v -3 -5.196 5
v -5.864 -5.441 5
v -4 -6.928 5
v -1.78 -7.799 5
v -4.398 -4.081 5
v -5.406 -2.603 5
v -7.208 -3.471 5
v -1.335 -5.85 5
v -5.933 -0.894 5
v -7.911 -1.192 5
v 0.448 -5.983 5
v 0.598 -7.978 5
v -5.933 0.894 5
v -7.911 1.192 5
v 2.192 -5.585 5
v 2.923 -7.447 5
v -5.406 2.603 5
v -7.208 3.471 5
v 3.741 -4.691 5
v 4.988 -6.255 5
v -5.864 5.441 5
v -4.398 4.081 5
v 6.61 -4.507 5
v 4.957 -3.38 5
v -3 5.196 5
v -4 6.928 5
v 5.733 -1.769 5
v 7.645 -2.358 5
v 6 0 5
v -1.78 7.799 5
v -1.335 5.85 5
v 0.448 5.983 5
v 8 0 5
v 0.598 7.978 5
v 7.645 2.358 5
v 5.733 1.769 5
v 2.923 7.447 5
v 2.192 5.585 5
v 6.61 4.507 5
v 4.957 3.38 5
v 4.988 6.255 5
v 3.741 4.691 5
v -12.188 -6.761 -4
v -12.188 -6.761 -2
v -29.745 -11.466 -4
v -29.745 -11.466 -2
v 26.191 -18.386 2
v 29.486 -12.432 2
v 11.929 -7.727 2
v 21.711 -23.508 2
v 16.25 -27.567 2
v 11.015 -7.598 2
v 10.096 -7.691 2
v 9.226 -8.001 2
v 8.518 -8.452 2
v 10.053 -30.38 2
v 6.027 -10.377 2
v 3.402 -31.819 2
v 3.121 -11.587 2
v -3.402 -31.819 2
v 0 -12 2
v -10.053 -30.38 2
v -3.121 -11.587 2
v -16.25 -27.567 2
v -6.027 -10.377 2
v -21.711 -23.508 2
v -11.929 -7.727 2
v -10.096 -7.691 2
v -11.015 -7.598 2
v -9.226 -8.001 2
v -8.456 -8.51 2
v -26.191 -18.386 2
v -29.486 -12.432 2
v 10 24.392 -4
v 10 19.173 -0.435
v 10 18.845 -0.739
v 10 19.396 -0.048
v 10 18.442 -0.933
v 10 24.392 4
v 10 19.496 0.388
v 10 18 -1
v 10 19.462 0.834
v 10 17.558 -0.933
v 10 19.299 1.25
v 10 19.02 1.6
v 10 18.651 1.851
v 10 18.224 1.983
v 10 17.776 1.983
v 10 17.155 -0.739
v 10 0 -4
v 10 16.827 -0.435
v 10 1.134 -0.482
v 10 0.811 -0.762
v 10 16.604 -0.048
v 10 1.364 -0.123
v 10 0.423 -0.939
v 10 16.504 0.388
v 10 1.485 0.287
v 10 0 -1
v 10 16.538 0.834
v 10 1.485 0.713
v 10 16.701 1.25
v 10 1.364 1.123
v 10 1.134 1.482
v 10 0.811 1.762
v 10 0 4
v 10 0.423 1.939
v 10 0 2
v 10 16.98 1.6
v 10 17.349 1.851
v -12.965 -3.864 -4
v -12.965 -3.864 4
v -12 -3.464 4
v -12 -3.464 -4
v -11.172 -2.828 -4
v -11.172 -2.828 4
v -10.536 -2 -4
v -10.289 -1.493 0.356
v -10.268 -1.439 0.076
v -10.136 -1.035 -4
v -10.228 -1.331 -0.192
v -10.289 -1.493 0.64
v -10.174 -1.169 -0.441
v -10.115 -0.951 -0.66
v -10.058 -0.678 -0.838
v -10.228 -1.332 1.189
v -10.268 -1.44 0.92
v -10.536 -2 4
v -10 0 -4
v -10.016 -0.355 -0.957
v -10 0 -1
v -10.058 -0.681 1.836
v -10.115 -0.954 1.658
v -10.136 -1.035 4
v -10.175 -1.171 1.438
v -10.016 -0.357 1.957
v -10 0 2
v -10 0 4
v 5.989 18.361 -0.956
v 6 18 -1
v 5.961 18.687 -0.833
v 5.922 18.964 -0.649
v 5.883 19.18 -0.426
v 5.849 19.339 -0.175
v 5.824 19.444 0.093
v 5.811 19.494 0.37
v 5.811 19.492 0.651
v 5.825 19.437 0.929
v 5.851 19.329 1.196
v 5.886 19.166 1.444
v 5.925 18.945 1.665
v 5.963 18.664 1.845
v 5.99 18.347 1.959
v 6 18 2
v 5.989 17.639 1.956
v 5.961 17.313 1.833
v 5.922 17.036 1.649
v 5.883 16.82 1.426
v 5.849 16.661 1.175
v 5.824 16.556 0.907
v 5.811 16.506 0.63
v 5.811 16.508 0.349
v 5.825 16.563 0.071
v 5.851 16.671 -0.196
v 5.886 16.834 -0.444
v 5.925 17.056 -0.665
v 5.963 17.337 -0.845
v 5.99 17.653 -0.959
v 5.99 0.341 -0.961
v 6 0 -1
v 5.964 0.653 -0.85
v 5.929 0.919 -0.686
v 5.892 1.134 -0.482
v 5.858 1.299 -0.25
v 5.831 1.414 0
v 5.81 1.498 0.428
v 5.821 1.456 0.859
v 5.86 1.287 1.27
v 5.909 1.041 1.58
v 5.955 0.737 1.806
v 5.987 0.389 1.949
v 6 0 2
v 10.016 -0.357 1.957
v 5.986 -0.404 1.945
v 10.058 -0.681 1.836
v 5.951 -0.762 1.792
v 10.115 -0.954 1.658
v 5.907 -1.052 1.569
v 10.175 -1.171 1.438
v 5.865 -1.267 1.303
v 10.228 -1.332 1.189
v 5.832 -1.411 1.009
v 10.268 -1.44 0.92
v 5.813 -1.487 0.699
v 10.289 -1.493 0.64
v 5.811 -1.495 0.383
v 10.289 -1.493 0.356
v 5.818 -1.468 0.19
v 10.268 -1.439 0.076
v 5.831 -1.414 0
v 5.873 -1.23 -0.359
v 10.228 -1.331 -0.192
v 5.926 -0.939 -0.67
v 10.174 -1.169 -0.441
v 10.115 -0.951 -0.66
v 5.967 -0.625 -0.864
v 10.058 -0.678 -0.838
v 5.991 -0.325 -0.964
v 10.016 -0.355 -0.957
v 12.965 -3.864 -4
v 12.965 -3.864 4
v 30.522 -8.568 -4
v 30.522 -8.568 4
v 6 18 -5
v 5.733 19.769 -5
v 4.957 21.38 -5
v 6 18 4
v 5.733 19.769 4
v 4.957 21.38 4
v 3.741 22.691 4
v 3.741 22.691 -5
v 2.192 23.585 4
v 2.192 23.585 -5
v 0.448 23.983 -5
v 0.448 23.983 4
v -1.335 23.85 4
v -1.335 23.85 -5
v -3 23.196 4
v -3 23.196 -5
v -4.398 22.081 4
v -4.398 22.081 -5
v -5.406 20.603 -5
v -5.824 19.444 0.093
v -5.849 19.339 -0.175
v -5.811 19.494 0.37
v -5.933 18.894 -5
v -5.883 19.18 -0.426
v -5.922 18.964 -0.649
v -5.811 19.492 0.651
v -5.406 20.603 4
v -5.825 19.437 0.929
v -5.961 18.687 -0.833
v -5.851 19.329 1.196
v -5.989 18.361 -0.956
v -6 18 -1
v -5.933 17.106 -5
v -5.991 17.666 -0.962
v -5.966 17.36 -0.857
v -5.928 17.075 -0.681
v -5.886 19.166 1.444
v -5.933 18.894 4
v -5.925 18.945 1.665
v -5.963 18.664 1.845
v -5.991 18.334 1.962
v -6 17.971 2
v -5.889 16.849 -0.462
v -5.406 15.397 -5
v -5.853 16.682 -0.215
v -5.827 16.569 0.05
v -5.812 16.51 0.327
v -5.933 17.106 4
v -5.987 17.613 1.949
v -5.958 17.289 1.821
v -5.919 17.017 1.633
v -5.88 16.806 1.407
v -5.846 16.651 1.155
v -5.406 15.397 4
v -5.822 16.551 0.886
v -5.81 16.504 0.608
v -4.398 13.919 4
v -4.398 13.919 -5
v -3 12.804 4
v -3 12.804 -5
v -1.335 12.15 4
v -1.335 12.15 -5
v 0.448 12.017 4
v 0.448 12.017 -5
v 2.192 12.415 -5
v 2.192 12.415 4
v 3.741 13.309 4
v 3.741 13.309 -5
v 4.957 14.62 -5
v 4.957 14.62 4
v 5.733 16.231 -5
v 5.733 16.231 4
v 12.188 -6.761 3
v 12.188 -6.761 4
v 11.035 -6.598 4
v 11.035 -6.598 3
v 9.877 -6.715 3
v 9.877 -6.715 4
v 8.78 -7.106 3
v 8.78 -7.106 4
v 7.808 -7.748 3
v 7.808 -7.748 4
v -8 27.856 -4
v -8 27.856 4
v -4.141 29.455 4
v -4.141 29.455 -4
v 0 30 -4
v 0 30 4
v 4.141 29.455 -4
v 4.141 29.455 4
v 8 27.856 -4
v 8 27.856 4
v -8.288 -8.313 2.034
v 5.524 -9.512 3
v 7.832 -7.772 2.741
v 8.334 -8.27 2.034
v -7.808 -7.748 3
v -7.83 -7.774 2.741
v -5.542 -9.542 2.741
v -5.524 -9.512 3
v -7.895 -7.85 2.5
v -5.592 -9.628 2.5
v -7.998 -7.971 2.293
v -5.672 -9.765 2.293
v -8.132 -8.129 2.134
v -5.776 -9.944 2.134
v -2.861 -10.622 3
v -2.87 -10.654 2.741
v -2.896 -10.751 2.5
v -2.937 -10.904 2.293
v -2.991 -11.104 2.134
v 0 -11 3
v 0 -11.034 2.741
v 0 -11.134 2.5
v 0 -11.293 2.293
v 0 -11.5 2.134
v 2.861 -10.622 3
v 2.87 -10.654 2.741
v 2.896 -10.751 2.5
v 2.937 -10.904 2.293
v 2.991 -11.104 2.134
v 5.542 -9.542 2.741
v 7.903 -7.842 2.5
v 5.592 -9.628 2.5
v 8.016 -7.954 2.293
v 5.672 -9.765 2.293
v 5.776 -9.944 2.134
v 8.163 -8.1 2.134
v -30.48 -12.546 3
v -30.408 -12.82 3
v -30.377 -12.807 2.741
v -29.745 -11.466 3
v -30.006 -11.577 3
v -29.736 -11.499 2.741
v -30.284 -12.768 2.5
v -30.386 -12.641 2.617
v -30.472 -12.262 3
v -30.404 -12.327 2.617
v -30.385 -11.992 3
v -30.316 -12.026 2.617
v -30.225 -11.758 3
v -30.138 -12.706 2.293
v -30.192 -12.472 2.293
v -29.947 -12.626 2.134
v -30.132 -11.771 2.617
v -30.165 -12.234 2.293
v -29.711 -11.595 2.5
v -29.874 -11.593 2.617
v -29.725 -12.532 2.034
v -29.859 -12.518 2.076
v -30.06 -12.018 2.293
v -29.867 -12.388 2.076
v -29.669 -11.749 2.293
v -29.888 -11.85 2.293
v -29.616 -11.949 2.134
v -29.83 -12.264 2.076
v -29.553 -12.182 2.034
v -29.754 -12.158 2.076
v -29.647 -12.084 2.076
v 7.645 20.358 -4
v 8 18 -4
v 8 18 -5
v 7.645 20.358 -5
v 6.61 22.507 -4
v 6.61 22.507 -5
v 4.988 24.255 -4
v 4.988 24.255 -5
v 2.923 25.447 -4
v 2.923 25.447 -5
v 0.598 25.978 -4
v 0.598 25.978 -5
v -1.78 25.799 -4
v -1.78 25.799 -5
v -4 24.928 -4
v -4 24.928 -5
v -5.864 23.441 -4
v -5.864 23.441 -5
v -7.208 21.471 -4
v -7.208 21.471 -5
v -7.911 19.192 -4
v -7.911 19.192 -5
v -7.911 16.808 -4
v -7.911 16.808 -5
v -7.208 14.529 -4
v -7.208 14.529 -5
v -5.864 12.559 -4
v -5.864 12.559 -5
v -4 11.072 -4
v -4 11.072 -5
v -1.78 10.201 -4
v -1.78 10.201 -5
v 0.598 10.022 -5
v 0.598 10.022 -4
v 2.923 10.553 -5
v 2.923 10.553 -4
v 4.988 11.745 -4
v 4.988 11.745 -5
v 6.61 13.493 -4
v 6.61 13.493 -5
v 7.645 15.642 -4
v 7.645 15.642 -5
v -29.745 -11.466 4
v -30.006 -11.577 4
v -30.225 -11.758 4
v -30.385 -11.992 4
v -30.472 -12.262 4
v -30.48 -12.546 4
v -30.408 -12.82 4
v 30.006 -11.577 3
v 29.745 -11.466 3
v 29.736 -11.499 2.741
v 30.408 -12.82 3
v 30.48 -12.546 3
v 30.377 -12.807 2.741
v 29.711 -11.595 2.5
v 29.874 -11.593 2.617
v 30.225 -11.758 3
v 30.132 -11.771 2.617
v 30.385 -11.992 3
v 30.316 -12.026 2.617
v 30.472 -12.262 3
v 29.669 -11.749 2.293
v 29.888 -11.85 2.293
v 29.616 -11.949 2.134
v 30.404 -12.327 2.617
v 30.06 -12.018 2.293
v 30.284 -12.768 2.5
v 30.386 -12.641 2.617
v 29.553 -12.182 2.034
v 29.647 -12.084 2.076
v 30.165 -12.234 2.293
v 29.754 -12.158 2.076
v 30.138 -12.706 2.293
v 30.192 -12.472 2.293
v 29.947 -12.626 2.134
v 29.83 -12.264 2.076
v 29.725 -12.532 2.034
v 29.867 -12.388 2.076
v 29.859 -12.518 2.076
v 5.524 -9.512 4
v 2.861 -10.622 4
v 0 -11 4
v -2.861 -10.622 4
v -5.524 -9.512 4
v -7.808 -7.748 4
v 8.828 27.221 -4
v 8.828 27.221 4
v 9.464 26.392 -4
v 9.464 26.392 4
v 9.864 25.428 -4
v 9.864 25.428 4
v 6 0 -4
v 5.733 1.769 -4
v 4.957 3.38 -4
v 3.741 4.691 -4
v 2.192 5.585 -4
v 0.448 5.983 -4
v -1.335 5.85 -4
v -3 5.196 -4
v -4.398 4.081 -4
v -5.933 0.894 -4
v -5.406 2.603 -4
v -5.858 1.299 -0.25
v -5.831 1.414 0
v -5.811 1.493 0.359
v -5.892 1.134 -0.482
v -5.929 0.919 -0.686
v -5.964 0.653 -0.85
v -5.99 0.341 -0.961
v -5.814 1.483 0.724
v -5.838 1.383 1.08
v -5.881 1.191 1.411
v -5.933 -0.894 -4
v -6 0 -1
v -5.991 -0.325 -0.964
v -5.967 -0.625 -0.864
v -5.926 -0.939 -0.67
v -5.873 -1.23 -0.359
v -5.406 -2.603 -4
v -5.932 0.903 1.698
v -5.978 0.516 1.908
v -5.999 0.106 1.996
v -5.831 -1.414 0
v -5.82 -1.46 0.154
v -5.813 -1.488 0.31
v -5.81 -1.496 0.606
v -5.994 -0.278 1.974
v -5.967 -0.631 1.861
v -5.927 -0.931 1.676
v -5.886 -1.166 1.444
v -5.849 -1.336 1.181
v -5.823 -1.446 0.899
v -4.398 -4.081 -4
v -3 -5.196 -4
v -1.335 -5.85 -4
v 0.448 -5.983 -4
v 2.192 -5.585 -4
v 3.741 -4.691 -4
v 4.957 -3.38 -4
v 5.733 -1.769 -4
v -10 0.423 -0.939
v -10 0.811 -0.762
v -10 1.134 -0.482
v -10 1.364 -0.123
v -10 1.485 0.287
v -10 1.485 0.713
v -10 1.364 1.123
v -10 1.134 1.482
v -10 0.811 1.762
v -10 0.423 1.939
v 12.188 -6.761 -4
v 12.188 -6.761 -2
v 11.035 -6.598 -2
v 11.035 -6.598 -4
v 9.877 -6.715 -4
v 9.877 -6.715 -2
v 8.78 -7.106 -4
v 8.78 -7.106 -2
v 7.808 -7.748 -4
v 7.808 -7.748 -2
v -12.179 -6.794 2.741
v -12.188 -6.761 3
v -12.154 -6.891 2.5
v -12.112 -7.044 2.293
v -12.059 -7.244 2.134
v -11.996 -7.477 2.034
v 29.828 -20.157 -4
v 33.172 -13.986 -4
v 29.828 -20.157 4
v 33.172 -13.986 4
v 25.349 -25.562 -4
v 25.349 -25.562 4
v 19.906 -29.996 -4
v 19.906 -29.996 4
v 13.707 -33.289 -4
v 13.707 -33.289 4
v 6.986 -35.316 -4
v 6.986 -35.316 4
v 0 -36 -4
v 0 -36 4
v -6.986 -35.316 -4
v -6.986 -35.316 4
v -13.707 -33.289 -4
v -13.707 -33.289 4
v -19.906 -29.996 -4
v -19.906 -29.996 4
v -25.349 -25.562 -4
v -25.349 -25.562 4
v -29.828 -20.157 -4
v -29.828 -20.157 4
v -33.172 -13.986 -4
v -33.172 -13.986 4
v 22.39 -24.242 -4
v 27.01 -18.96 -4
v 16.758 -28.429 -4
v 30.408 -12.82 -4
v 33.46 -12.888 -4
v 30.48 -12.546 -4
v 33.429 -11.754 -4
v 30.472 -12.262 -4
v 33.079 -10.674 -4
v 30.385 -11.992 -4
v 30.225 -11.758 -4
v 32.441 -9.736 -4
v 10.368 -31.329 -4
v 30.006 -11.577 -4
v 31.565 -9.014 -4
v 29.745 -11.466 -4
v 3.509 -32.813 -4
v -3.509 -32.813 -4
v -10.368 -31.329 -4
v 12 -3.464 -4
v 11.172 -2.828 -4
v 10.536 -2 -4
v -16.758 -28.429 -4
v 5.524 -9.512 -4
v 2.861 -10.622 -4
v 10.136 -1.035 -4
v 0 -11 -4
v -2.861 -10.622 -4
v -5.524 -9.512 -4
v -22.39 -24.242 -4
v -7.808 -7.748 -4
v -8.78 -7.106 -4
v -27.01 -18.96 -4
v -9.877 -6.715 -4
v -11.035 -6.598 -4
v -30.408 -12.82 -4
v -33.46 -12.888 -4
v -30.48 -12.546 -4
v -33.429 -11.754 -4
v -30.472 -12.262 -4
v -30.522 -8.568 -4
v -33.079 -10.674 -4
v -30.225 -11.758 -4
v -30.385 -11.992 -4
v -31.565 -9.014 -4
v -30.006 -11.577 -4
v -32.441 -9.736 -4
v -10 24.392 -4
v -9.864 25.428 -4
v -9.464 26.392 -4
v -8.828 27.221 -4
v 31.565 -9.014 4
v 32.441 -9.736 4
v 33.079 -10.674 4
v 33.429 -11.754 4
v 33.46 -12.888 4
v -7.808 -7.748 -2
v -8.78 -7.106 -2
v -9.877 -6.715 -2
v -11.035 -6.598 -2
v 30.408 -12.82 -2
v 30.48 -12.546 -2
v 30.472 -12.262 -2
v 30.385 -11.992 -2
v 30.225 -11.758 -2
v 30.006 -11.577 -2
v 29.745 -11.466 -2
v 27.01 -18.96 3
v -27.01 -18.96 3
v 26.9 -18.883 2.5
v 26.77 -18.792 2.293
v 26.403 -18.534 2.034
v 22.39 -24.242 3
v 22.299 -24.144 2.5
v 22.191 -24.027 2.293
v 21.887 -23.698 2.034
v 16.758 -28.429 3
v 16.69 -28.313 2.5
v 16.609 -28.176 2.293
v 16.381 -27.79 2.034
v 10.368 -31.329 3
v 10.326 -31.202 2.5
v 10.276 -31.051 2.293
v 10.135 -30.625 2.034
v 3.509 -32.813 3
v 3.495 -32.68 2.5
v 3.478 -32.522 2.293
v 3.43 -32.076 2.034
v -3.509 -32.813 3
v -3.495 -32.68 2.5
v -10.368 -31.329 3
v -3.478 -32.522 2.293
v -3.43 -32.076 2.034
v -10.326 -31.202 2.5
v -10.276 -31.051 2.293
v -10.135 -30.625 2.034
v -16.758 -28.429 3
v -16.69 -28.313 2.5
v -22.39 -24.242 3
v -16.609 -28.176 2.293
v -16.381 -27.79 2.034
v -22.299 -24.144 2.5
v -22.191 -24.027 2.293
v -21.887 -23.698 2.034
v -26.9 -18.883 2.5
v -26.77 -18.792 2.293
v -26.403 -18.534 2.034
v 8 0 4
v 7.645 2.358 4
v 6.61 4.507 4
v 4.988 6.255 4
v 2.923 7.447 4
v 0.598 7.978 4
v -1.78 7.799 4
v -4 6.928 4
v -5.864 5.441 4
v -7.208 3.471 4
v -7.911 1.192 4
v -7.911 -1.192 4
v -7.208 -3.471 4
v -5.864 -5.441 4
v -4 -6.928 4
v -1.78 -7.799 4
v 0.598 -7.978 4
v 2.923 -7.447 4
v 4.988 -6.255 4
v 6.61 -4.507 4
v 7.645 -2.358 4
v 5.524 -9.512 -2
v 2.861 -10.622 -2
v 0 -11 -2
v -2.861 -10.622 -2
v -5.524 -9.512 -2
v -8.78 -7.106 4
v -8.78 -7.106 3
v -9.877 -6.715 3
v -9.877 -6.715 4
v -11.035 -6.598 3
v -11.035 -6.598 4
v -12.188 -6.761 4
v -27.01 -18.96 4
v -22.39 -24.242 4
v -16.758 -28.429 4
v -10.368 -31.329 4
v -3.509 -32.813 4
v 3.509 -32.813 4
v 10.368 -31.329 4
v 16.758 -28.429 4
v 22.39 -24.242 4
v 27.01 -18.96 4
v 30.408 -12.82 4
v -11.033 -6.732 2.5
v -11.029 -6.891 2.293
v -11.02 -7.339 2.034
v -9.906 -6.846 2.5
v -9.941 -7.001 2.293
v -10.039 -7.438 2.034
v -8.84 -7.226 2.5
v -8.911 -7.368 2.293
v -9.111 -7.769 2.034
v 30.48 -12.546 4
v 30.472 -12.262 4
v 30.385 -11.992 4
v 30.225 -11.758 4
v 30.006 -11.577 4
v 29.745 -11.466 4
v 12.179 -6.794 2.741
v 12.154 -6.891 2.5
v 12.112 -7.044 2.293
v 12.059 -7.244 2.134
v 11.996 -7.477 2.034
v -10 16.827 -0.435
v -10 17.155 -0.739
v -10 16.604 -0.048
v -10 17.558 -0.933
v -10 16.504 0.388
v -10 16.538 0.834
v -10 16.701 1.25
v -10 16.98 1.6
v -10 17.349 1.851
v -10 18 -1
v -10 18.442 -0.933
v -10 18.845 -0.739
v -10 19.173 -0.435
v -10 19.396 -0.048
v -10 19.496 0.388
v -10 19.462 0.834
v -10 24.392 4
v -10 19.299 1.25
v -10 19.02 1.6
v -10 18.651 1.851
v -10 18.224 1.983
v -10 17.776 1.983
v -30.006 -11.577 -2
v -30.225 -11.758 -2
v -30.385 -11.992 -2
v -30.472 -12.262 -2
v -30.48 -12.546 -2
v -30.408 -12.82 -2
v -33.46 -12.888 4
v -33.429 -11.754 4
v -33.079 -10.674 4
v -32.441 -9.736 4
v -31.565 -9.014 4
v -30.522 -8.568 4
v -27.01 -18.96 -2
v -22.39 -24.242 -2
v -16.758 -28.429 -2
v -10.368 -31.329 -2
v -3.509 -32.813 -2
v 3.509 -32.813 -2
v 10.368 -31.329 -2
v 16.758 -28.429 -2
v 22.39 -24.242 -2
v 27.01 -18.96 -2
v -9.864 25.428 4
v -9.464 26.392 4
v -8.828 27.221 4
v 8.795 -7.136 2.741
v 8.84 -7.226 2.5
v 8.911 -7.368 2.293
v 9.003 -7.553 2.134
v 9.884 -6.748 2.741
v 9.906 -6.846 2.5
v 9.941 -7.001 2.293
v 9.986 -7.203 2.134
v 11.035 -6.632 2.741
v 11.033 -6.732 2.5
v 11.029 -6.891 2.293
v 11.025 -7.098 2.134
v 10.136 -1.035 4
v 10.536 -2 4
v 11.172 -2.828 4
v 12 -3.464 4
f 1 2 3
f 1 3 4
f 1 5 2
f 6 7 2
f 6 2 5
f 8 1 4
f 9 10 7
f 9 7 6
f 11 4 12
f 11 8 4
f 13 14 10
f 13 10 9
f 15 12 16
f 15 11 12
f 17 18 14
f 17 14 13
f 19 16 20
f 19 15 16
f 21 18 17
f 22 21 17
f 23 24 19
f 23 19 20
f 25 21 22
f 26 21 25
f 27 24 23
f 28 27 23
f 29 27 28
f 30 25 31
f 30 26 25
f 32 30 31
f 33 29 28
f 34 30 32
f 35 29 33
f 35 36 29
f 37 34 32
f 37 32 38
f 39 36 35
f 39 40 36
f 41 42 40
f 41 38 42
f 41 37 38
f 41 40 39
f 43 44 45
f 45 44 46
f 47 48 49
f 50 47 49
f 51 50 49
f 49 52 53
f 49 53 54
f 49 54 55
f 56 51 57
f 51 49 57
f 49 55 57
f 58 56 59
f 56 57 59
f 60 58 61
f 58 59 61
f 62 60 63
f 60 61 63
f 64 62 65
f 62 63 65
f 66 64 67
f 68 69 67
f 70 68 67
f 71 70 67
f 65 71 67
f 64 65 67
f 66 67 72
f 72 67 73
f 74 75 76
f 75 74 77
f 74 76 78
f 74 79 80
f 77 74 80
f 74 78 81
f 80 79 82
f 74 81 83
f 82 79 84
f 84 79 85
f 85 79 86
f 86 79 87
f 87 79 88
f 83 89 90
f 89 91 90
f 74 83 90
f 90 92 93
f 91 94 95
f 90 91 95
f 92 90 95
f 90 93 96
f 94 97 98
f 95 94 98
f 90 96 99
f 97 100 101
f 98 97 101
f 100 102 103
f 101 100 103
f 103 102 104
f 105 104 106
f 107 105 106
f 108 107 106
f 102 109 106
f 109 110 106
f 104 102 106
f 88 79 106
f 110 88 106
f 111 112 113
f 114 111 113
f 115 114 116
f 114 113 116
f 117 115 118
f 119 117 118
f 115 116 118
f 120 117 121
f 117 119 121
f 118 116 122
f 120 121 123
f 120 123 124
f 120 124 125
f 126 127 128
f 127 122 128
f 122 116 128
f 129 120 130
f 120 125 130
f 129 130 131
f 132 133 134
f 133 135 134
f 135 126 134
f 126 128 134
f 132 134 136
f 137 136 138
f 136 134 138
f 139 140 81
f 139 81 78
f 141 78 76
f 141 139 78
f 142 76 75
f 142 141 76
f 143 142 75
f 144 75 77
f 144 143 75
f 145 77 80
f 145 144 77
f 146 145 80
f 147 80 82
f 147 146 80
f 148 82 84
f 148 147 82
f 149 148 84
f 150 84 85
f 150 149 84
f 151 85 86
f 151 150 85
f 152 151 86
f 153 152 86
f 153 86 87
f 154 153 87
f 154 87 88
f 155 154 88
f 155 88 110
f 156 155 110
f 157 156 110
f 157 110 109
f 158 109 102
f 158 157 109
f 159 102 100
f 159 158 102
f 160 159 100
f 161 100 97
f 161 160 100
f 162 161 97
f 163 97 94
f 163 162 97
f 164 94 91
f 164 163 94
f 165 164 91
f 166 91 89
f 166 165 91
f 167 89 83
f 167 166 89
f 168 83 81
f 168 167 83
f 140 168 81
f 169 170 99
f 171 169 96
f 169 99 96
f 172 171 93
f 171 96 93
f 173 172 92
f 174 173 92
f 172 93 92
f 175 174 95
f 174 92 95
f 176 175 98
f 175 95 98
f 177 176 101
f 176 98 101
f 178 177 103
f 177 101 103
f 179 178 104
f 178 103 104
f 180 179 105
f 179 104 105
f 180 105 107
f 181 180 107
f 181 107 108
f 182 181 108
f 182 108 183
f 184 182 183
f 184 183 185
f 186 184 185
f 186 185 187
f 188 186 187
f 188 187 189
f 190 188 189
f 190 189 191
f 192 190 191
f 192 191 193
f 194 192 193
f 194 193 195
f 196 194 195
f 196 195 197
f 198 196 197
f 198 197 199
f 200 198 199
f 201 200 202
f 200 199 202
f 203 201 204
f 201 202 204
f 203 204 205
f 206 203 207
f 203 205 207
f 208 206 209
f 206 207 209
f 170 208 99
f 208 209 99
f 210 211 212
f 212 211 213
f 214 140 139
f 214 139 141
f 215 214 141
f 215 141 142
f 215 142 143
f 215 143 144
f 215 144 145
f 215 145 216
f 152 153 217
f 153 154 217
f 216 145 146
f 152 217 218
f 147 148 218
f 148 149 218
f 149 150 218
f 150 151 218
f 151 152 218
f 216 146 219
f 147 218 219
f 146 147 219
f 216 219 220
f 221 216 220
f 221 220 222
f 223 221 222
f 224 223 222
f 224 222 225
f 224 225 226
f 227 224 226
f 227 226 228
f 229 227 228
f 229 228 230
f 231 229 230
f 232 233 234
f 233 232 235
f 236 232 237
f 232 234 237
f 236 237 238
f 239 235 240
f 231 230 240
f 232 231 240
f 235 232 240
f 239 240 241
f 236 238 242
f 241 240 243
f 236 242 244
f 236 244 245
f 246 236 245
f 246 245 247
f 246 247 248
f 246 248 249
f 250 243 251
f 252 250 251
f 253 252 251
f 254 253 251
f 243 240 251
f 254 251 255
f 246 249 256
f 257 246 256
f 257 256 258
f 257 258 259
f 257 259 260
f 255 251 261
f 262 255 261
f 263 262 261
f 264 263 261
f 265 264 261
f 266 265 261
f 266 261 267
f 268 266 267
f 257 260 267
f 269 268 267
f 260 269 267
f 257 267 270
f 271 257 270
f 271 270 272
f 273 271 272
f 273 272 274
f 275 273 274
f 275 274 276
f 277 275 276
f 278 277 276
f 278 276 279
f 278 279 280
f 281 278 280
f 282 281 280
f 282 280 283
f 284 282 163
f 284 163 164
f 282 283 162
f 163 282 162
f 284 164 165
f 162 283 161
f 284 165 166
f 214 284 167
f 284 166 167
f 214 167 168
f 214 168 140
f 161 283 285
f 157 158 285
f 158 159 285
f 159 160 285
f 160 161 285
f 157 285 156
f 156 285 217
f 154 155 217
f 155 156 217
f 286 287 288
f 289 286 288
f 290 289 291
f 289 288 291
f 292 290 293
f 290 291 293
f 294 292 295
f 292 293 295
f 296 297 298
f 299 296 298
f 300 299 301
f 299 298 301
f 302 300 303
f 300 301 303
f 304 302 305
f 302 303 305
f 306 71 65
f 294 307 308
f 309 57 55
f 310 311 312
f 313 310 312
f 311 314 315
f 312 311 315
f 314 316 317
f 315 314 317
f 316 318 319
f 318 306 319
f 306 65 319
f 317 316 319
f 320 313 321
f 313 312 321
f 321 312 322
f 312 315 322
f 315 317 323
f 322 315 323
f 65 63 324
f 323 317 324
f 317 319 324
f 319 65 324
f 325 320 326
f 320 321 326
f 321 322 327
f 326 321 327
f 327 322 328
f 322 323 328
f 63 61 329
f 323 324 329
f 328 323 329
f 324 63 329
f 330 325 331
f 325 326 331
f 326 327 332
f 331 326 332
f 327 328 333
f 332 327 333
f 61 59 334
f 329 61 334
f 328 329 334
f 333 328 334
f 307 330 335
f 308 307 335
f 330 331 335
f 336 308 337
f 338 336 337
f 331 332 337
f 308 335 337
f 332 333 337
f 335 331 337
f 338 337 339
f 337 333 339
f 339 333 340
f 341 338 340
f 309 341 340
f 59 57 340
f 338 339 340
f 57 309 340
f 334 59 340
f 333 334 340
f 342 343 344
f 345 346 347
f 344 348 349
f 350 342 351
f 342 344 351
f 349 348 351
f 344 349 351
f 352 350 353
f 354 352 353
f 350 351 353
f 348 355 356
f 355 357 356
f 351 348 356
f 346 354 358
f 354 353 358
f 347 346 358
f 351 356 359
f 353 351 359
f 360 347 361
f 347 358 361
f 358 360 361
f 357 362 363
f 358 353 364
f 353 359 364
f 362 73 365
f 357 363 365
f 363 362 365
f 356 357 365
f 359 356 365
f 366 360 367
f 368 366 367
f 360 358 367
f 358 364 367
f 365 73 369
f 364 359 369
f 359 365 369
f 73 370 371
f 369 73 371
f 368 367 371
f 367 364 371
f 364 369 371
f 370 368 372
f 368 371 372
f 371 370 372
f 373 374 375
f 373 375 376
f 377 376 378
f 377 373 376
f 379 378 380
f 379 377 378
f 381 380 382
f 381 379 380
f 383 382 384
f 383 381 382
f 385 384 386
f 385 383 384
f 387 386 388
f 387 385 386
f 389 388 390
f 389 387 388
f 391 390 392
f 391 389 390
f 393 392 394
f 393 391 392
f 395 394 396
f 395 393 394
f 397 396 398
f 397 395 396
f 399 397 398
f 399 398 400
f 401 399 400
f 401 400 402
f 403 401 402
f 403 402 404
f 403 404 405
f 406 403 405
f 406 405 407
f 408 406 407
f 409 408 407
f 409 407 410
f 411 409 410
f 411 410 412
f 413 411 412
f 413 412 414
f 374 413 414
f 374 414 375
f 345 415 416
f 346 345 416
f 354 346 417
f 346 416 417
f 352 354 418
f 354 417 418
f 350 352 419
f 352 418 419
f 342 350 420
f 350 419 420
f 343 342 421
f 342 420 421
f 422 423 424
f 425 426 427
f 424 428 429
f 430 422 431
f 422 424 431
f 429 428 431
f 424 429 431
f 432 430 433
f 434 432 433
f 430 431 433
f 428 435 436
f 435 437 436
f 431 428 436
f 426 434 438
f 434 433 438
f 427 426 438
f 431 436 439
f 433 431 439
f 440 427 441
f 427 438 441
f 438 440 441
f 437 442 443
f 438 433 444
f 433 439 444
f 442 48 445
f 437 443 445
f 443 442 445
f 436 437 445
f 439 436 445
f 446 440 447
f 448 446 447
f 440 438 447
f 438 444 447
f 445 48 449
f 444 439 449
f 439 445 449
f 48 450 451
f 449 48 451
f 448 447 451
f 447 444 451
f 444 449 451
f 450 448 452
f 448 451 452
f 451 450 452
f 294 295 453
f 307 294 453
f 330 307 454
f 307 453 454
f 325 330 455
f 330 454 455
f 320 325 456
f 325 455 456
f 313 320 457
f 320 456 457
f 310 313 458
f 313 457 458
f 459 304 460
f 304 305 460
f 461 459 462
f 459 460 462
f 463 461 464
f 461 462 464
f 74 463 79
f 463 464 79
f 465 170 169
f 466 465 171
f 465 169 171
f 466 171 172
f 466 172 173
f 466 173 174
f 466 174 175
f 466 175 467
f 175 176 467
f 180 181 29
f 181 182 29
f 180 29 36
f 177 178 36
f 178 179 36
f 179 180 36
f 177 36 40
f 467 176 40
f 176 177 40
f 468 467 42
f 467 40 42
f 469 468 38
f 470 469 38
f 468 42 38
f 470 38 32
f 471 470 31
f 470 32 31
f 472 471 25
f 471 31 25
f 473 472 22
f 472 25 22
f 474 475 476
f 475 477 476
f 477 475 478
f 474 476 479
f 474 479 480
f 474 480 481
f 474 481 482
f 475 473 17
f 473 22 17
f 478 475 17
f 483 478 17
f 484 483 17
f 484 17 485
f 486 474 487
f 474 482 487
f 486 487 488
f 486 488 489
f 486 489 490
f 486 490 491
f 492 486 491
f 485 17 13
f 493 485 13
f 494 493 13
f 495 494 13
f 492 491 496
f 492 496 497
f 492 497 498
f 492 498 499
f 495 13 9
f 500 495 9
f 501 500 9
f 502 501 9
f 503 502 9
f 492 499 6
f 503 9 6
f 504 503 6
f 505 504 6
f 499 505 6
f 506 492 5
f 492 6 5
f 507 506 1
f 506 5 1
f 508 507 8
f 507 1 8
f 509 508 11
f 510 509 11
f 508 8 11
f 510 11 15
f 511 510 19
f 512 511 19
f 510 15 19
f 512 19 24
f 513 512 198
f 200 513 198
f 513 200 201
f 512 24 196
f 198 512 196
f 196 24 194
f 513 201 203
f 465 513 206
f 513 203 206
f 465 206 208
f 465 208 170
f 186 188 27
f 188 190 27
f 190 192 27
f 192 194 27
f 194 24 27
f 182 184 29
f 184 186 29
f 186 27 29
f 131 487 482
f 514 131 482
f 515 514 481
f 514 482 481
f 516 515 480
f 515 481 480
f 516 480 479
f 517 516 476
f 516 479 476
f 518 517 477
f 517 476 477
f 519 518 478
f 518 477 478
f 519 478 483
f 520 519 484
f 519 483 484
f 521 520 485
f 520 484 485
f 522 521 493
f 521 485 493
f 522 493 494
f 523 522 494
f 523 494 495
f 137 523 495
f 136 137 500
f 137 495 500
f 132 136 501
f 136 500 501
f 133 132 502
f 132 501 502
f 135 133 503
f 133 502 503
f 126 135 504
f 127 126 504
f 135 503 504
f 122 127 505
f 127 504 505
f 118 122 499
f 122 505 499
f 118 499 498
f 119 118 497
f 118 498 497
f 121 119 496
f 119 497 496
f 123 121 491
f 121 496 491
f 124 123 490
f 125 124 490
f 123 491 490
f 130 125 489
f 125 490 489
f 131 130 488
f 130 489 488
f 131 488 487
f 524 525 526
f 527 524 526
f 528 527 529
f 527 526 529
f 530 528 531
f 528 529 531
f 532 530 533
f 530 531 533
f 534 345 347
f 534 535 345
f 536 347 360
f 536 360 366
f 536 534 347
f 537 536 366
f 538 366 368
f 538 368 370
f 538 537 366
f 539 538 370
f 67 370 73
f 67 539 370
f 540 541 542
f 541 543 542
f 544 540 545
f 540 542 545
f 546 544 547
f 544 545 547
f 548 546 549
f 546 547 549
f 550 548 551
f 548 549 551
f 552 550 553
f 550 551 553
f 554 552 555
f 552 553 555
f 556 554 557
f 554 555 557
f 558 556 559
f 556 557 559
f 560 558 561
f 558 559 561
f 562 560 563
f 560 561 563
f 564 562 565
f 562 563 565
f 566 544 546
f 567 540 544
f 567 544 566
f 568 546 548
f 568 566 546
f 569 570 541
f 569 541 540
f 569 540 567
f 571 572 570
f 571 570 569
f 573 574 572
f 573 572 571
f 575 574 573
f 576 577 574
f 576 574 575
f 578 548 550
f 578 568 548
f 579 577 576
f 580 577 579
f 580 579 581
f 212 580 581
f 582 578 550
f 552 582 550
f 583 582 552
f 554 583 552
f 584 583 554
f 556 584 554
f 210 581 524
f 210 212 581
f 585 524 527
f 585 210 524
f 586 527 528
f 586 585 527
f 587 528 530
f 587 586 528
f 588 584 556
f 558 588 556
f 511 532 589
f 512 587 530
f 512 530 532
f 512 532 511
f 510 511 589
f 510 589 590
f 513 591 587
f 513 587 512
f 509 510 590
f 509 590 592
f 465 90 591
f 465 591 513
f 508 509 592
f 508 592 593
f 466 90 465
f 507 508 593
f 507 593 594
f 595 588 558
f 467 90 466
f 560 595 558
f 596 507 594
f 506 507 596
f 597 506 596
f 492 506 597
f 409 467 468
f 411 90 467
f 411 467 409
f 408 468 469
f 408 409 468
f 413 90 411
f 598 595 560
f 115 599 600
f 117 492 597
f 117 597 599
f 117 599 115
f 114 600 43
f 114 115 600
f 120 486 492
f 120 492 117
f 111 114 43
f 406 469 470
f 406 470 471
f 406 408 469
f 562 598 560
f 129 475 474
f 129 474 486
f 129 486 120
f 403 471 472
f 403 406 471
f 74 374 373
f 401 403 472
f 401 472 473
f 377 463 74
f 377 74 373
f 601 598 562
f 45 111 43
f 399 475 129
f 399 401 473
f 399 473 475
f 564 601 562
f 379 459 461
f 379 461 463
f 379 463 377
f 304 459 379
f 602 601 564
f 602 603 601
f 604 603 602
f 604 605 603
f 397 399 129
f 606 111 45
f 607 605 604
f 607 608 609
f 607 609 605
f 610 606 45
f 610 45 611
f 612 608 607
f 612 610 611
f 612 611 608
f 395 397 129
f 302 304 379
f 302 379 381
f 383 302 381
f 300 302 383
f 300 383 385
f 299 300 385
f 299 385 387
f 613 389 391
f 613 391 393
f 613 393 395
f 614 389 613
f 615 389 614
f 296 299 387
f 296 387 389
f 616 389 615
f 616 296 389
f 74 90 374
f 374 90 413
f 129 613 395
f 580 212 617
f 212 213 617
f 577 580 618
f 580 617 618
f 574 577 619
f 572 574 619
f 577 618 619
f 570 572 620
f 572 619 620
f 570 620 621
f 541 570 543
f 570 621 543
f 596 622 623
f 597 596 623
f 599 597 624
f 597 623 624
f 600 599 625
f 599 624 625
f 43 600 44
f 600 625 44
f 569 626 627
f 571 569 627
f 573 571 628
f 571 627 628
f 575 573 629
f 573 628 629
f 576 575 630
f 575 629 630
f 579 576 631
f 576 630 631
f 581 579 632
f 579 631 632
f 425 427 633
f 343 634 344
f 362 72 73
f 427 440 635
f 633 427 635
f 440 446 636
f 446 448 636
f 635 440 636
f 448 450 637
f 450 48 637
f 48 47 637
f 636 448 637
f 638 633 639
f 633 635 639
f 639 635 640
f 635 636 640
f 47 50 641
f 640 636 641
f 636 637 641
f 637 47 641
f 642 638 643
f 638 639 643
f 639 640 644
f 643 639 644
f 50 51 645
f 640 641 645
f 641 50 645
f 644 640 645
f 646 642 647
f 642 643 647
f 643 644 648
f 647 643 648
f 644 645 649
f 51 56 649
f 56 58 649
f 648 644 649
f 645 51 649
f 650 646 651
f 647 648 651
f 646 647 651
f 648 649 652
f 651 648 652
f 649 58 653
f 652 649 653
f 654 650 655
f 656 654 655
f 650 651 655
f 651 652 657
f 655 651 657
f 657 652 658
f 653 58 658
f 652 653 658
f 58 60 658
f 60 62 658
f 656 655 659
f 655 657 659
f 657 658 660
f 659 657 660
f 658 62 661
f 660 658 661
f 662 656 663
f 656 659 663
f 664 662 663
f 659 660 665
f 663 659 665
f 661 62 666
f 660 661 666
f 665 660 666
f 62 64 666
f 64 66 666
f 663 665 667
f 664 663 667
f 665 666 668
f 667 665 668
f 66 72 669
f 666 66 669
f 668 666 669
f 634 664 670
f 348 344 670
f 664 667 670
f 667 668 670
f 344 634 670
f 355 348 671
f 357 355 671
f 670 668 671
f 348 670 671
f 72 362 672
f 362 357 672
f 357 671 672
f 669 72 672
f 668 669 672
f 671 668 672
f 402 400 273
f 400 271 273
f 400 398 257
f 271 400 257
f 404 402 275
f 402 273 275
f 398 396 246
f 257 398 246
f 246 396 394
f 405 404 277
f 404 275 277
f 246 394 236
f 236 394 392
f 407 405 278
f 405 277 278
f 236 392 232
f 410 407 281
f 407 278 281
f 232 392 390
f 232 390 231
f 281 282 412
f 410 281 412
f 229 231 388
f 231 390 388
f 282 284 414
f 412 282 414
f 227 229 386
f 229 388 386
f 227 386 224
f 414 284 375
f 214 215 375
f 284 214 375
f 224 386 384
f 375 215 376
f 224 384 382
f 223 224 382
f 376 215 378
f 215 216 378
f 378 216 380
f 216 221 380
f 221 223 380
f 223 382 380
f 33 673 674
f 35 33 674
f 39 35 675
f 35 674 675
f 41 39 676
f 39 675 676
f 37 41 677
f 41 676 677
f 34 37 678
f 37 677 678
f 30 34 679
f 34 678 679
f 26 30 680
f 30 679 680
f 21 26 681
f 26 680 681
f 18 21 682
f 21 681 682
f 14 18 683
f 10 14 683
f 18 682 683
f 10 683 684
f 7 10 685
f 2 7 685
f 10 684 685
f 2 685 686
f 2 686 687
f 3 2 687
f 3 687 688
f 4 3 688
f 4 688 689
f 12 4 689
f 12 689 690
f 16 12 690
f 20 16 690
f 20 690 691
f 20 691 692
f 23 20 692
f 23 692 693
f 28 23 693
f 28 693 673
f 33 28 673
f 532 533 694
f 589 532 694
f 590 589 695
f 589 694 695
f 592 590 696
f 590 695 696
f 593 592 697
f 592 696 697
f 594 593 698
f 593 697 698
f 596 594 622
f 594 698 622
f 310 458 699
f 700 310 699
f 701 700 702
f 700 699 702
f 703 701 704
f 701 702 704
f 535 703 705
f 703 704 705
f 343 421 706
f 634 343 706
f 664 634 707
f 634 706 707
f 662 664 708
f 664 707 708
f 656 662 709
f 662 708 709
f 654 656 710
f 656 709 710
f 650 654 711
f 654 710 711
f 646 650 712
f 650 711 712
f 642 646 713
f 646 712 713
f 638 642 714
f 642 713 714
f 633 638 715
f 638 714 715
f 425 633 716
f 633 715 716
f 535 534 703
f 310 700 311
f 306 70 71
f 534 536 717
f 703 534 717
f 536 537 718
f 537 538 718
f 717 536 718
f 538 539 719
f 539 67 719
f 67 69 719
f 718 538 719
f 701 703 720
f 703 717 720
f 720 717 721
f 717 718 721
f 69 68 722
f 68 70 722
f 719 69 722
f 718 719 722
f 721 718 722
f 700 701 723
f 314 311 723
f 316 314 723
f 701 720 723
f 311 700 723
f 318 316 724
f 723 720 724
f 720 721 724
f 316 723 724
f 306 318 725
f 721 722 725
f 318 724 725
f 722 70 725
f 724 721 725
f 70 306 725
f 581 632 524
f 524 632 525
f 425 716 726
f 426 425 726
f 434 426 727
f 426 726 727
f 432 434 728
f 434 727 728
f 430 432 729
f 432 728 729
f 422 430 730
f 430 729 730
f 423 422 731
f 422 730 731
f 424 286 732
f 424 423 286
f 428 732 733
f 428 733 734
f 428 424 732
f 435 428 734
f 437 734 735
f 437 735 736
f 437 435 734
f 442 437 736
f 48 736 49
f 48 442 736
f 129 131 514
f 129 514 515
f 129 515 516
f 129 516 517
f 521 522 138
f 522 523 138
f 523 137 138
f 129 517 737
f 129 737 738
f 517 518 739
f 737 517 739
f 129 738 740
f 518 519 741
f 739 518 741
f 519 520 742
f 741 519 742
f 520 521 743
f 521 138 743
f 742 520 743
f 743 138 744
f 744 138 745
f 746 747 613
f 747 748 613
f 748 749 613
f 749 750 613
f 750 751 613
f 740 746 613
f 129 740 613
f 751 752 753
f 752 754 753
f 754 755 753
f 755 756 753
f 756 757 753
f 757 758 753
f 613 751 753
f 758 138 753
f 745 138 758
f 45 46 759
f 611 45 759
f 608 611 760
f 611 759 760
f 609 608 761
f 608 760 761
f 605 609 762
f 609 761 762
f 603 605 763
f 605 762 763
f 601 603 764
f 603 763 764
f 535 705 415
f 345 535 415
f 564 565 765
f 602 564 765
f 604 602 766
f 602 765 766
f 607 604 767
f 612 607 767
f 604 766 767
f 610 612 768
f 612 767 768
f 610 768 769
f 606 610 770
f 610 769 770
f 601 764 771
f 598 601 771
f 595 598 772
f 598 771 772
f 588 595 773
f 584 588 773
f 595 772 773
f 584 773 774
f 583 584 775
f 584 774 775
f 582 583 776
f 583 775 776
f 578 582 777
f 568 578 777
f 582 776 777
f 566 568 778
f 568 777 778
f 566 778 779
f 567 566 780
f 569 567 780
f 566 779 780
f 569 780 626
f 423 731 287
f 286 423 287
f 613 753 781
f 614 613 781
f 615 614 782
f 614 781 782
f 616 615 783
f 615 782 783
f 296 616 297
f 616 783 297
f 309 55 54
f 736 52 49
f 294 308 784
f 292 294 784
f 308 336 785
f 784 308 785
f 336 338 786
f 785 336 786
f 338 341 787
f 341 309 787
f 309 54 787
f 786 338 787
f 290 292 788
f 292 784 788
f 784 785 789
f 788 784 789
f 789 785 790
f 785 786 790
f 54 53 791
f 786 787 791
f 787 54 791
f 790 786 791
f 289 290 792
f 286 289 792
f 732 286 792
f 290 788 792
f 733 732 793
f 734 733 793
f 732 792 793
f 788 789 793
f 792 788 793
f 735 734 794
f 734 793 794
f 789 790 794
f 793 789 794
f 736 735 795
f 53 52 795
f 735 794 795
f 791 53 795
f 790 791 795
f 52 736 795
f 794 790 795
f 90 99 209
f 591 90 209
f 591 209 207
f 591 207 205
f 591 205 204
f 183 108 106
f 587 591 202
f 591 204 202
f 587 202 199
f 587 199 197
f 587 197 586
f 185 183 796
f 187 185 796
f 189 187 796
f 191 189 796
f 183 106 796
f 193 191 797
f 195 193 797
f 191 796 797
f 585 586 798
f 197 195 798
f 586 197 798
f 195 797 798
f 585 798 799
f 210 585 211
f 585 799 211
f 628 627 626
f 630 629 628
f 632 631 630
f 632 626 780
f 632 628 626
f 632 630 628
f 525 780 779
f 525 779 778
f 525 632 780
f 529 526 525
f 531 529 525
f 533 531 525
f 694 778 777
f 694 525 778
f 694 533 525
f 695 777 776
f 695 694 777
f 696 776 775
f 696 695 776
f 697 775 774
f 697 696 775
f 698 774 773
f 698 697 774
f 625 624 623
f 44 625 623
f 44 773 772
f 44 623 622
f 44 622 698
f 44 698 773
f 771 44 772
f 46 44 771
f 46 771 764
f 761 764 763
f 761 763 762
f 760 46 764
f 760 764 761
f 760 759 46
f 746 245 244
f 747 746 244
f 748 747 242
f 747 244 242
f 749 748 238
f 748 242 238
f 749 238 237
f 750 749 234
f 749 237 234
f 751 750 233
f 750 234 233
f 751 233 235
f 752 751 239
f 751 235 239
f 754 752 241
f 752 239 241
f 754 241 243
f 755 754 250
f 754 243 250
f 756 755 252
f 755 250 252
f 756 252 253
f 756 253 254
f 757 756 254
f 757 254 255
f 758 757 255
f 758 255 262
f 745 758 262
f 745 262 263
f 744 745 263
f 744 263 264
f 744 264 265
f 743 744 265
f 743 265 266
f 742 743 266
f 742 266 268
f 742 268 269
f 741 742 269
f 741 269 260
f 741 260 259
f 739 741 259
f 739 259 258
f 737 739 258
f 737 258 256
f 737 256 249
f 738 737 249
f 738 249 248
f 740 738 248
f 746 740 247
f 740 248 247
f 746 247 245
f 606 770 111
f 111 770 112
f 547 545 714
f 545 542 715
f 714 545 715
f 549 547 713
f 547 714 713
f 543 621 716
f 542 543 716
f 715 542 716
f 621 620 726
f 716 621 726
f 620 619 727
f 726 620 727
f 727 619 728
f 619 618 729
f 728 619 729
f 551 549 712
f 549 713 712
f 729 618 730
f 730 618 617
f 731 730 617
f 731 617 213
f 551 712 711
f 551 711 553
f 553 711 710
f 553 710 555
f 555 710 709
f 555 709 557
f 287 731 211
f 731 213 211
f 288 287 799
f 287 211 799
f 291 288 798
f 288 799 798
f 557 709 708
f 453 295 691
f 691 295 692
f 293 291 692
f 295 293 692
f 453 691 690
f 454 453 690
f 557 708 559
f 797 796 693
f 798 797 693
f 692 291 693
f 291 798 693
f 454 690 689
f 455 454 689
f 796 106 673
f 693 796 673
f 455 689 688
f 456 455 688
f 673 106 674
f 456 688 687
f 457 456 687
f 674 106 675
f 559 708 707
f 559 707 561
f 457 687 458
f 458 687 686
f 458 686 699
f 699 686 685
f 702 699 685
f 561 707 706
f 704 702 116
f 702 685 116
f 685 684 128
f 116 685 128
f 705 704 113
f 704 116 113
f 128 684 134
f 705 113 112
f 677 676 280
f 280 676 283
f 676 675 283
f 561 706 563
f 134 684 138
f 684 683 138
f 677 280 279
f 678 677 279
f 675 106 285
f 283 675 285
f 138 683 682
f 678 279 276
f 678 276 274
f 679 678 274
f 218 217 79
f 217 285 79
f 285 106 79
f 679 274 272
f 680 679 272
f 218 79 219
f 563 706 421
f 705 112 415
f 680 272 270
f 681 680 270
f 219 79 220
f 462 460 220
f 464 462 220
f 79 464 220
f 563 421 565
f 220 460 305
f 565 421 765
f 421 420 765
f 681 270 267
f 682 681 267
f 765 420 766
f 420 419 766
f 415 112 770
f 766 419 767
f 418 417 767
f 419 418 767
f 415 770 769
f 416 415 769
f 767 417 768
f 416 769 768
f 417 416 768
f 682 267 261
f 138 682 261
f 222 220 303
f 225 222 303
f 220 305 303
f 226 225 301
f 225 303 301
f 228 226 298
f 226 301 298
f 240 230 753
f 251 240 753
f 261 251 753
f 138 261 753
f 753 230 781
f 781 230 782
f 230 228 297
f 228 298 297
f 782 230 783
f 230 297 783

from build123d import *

# Parameters (mm, degrees)
SKETCH1_R           = 8
SKETCH1_R_2         = 6
BOSS_EXTRUDE2_DEPTH = 5
BOSS_EXTRUDE3_START = 4
SKETCH1_4_R         = 8
SKETCH1_4_R_2       = 6
BOSS_EXTRUDE3_DEPTH = 4
SKETCH1_8_R         = 8
SKETCH1_8_R_2       = 6
BOSS_EXTRUDE4_DEPTH = 4
SKETCH1_9_R         = 8
SKETCH1_9_R_2       = 6
BOSS_EXTRUDE5_DEPTH = 5
SKETCH1_10_R        = 8
BOSS_EXTRUDE6_DEPTH = 4
BOSS_EXTRUDE7_DEPTH = 2
SKETCH2_R           = 1.5
CUT_EXTRUDE1_DEPTH  = 74
FILLET2_R           = 1


with BuildPart() as part:
    # Sketch1 → Boss-Extrude2 (new body)
    with BuildSketch(Plane.XY):
        with Locations((0, 18)):
            Circle(SKETCH1_R)
        with Locations((0, 18)):
            Circle(SKETCH1_R_2, mode=Mode.SUBTRACT)
    extrude(amount=-BOSS_EXTRUDE2_DEPTH)

    # Sketch1<4> → Boss-Extrude3 (add)
    with BuildSketch(Plane.XY.offset(BOSS_EXTRUDE3_START)):
        with Locations((0, 18)):
            Circle(SKETCH1_4_R)
        with Locations((0, 18)):
            Circle(SKETCH1_4_R_2, mode=Mode.SUBTRACT)
    extrude(amount=-BOSS_EXTRUDE3_DEPTH)



with BuildPart() as body_2:
    # Sketch1<8> → Boss-Extrude4 (new body)
    with BuildSketch(Plane.XY):
        Circle(SKETCH1_8_R)
        Circle(SKETCH1_8_R_2, mode=Mode.SUBTRACT)
    extrude(amount=-BOSS_EXTRUDE4_DEPTH)

    # Sketch1<9> → Boss-Extrude5 (add)
    with BuildSketch(Plane.XY):
        Circle(SKETCH1_9_R)
        Circle(SKETCH1_9_R_2, mode=Mode.SUBTRACT)
    extrude(amount=BOSS_EXTRUDE5_DEPTH)


with BuildPart() as part_1:
    add(part.part)

    add(body_2.part)  # Boss-Extrude6 merges body 2
    # Sketch1<10> → Boss-Extrude6 (add, symmetric)
    with BuildSketch(Plane.XY):
        with BuildLine():
            ThreePointArc((-8, 27.856406461), (0, 30), (8, 27.856406461))
            ThreePointArc((8, 27.856406461), (9.464101615, 26.392304845), (10, 24.392304845))
            Line((10, 24.392304845), (10, 0))
            ThreePointArc((10, 0), (10.826586639, -2.435045716), (12.96472382, -3.863703305))
            Line((12.96472382, -3.863703305), (30.521723645, -8.56808723))
            ThreePointArc((30.521723645, -8.56808723), (33.079490803, -10.673939697), (33.172253398, -13.985764352))
            ThreePointArc((33.172253398, -13.985764352), (0, -36), (-33.172253398, -13.985764352))
            ThreePointArc((-33.172253398, -13.985764352), (-33.079490803, -10.673939697), (-30.521723645, -8.56808723))
            Line((-30.521723645, -8.56808723), (-12.96472382, -3.863703305))
            ThreePointArc((-12.96472382, -3.863703305), (-10.826586639, -2.435045716), (-10, 0))
            Line((-10, 0), (-10, 24.392304845))
            ThreePointArc((-10, 24.392304845), (-9.464101615, 26.392304845), (-8, 27.856406461))
        make_face()
        with Locations((0, 18)):
            Circle(SKETCH1_10_R, mode=Mode.SUBTRACT)
        Circle(SKETCH1_10_R, mode=Mode.SUBTRACT)
        with BuildLine():
            ThreePointArc((12.188266684, -6.761480784), (9.876608994, -6.714952527), (7.808142843, -7.748090432))
            ThreePointArc((7.808142843, -7.748090432), (0, -11), (-7.808142843, -7.748090432))
            ThreePointArc((-7.808142843, -7.748090432), (-9.876608994, -6.714952527), (-12.188266684, -6.761480784))
            Line((-12.188266684, -6.761480784), (-29.74526651, -11.465864709))
            ThreePointArc((-29.74526651, -11.465864709), (-30.384708299, -11.992327826), (-30.407898948, -12.820283989))
            ThreePointArc((-30.407898948, -12.820283989), (0, -33), (30.407898948, -12.820283989))
            ThreePointArc((30.407898948, -12.820283989), (30.384708299, -11.992327826), (29.74526651, -11.465864709))
            Line((29.74526651, -11.465864709), (12.188266684, -6.761480784))
        make_face(mode=Mode.SUBTRACT)
    extrude(amount=BOSS_EXTRUDE6_DEPTH, both=True)

    # Sketch1<11> → Boss-Extrude7 (add, symmetric)
    with BuildSketch(Plane.XY):
        with BuildLine():
            Line((12.188266684, -6.761480784), (29.74526651, -11.465864709))
            ThreePointArc((29.74526651, -11.465864709), (30.384708299, -11.992327826), (30.407898948, -12.820283989))
            ThreePointArc((30.407898948, -12.820283989), (0, -33), (-30.407898948, -12.820283989))
            ThreePointArc((-30.407898948, -12.820283989), (-30.384708299, -11.992327826), (-29.74526651, -11.465864709))
            Line((-29.74526651, -11.465864709), (-12.188266684, -6.761480784))
            ThreePointArc((-12.188266684, -6.761480784), (-9.876608994, -6.714952527), (-7.808142843, -7.748090432))
            ThreePointArc((-7.808142843, -7.748090432), (0, -11), (7.808142843, -7.748090432))
            ThreePointArc((7.808142843, -7.748090432), (9.876608994, -6.714952527), (12.188266684, -6.761480784))
        make_face()
    extrude(amount=BOSS_EXTRUDE7_DEPTH, both=True)

    # Sketch2 → Cut-Extrude1 (cut, symmetric)
    with BuildSketch(Plane(origin=(0, 0, 0), x_dir=(0, 0, -1), z_dir=(1, 0, 0))):
        with Locations((-0.5, 18)):
            Circle(SKETCH2_R)
        with Locations((-0.5, 0)):
            Circle(SKETCH2_R)
    extrude(amount=CUT_EXTRUDE1_DEPTH, both=True, mode=Mode.SUBTRACT)

    # Fillet2
    fillet2_edges = [part_1.edges().sort_by_distance(p)[0] for p in [
        (20.966766597, -9.113672746, 2),
        (0, -11, 2),
        (-9.876608994, -6.714952527, 2),
        (0, -33, 2),
        (30.384708299, -11.992327826, 2),
        (9.876608994, -6.714952527, 2),
        (-20.966766597, -9.113672746, 2),
        (-30.384708299, -11.992327826, 2),
    ]]
    fillet(fillet2_edges, radius=FILLET2_R)


solid = part_1.part
